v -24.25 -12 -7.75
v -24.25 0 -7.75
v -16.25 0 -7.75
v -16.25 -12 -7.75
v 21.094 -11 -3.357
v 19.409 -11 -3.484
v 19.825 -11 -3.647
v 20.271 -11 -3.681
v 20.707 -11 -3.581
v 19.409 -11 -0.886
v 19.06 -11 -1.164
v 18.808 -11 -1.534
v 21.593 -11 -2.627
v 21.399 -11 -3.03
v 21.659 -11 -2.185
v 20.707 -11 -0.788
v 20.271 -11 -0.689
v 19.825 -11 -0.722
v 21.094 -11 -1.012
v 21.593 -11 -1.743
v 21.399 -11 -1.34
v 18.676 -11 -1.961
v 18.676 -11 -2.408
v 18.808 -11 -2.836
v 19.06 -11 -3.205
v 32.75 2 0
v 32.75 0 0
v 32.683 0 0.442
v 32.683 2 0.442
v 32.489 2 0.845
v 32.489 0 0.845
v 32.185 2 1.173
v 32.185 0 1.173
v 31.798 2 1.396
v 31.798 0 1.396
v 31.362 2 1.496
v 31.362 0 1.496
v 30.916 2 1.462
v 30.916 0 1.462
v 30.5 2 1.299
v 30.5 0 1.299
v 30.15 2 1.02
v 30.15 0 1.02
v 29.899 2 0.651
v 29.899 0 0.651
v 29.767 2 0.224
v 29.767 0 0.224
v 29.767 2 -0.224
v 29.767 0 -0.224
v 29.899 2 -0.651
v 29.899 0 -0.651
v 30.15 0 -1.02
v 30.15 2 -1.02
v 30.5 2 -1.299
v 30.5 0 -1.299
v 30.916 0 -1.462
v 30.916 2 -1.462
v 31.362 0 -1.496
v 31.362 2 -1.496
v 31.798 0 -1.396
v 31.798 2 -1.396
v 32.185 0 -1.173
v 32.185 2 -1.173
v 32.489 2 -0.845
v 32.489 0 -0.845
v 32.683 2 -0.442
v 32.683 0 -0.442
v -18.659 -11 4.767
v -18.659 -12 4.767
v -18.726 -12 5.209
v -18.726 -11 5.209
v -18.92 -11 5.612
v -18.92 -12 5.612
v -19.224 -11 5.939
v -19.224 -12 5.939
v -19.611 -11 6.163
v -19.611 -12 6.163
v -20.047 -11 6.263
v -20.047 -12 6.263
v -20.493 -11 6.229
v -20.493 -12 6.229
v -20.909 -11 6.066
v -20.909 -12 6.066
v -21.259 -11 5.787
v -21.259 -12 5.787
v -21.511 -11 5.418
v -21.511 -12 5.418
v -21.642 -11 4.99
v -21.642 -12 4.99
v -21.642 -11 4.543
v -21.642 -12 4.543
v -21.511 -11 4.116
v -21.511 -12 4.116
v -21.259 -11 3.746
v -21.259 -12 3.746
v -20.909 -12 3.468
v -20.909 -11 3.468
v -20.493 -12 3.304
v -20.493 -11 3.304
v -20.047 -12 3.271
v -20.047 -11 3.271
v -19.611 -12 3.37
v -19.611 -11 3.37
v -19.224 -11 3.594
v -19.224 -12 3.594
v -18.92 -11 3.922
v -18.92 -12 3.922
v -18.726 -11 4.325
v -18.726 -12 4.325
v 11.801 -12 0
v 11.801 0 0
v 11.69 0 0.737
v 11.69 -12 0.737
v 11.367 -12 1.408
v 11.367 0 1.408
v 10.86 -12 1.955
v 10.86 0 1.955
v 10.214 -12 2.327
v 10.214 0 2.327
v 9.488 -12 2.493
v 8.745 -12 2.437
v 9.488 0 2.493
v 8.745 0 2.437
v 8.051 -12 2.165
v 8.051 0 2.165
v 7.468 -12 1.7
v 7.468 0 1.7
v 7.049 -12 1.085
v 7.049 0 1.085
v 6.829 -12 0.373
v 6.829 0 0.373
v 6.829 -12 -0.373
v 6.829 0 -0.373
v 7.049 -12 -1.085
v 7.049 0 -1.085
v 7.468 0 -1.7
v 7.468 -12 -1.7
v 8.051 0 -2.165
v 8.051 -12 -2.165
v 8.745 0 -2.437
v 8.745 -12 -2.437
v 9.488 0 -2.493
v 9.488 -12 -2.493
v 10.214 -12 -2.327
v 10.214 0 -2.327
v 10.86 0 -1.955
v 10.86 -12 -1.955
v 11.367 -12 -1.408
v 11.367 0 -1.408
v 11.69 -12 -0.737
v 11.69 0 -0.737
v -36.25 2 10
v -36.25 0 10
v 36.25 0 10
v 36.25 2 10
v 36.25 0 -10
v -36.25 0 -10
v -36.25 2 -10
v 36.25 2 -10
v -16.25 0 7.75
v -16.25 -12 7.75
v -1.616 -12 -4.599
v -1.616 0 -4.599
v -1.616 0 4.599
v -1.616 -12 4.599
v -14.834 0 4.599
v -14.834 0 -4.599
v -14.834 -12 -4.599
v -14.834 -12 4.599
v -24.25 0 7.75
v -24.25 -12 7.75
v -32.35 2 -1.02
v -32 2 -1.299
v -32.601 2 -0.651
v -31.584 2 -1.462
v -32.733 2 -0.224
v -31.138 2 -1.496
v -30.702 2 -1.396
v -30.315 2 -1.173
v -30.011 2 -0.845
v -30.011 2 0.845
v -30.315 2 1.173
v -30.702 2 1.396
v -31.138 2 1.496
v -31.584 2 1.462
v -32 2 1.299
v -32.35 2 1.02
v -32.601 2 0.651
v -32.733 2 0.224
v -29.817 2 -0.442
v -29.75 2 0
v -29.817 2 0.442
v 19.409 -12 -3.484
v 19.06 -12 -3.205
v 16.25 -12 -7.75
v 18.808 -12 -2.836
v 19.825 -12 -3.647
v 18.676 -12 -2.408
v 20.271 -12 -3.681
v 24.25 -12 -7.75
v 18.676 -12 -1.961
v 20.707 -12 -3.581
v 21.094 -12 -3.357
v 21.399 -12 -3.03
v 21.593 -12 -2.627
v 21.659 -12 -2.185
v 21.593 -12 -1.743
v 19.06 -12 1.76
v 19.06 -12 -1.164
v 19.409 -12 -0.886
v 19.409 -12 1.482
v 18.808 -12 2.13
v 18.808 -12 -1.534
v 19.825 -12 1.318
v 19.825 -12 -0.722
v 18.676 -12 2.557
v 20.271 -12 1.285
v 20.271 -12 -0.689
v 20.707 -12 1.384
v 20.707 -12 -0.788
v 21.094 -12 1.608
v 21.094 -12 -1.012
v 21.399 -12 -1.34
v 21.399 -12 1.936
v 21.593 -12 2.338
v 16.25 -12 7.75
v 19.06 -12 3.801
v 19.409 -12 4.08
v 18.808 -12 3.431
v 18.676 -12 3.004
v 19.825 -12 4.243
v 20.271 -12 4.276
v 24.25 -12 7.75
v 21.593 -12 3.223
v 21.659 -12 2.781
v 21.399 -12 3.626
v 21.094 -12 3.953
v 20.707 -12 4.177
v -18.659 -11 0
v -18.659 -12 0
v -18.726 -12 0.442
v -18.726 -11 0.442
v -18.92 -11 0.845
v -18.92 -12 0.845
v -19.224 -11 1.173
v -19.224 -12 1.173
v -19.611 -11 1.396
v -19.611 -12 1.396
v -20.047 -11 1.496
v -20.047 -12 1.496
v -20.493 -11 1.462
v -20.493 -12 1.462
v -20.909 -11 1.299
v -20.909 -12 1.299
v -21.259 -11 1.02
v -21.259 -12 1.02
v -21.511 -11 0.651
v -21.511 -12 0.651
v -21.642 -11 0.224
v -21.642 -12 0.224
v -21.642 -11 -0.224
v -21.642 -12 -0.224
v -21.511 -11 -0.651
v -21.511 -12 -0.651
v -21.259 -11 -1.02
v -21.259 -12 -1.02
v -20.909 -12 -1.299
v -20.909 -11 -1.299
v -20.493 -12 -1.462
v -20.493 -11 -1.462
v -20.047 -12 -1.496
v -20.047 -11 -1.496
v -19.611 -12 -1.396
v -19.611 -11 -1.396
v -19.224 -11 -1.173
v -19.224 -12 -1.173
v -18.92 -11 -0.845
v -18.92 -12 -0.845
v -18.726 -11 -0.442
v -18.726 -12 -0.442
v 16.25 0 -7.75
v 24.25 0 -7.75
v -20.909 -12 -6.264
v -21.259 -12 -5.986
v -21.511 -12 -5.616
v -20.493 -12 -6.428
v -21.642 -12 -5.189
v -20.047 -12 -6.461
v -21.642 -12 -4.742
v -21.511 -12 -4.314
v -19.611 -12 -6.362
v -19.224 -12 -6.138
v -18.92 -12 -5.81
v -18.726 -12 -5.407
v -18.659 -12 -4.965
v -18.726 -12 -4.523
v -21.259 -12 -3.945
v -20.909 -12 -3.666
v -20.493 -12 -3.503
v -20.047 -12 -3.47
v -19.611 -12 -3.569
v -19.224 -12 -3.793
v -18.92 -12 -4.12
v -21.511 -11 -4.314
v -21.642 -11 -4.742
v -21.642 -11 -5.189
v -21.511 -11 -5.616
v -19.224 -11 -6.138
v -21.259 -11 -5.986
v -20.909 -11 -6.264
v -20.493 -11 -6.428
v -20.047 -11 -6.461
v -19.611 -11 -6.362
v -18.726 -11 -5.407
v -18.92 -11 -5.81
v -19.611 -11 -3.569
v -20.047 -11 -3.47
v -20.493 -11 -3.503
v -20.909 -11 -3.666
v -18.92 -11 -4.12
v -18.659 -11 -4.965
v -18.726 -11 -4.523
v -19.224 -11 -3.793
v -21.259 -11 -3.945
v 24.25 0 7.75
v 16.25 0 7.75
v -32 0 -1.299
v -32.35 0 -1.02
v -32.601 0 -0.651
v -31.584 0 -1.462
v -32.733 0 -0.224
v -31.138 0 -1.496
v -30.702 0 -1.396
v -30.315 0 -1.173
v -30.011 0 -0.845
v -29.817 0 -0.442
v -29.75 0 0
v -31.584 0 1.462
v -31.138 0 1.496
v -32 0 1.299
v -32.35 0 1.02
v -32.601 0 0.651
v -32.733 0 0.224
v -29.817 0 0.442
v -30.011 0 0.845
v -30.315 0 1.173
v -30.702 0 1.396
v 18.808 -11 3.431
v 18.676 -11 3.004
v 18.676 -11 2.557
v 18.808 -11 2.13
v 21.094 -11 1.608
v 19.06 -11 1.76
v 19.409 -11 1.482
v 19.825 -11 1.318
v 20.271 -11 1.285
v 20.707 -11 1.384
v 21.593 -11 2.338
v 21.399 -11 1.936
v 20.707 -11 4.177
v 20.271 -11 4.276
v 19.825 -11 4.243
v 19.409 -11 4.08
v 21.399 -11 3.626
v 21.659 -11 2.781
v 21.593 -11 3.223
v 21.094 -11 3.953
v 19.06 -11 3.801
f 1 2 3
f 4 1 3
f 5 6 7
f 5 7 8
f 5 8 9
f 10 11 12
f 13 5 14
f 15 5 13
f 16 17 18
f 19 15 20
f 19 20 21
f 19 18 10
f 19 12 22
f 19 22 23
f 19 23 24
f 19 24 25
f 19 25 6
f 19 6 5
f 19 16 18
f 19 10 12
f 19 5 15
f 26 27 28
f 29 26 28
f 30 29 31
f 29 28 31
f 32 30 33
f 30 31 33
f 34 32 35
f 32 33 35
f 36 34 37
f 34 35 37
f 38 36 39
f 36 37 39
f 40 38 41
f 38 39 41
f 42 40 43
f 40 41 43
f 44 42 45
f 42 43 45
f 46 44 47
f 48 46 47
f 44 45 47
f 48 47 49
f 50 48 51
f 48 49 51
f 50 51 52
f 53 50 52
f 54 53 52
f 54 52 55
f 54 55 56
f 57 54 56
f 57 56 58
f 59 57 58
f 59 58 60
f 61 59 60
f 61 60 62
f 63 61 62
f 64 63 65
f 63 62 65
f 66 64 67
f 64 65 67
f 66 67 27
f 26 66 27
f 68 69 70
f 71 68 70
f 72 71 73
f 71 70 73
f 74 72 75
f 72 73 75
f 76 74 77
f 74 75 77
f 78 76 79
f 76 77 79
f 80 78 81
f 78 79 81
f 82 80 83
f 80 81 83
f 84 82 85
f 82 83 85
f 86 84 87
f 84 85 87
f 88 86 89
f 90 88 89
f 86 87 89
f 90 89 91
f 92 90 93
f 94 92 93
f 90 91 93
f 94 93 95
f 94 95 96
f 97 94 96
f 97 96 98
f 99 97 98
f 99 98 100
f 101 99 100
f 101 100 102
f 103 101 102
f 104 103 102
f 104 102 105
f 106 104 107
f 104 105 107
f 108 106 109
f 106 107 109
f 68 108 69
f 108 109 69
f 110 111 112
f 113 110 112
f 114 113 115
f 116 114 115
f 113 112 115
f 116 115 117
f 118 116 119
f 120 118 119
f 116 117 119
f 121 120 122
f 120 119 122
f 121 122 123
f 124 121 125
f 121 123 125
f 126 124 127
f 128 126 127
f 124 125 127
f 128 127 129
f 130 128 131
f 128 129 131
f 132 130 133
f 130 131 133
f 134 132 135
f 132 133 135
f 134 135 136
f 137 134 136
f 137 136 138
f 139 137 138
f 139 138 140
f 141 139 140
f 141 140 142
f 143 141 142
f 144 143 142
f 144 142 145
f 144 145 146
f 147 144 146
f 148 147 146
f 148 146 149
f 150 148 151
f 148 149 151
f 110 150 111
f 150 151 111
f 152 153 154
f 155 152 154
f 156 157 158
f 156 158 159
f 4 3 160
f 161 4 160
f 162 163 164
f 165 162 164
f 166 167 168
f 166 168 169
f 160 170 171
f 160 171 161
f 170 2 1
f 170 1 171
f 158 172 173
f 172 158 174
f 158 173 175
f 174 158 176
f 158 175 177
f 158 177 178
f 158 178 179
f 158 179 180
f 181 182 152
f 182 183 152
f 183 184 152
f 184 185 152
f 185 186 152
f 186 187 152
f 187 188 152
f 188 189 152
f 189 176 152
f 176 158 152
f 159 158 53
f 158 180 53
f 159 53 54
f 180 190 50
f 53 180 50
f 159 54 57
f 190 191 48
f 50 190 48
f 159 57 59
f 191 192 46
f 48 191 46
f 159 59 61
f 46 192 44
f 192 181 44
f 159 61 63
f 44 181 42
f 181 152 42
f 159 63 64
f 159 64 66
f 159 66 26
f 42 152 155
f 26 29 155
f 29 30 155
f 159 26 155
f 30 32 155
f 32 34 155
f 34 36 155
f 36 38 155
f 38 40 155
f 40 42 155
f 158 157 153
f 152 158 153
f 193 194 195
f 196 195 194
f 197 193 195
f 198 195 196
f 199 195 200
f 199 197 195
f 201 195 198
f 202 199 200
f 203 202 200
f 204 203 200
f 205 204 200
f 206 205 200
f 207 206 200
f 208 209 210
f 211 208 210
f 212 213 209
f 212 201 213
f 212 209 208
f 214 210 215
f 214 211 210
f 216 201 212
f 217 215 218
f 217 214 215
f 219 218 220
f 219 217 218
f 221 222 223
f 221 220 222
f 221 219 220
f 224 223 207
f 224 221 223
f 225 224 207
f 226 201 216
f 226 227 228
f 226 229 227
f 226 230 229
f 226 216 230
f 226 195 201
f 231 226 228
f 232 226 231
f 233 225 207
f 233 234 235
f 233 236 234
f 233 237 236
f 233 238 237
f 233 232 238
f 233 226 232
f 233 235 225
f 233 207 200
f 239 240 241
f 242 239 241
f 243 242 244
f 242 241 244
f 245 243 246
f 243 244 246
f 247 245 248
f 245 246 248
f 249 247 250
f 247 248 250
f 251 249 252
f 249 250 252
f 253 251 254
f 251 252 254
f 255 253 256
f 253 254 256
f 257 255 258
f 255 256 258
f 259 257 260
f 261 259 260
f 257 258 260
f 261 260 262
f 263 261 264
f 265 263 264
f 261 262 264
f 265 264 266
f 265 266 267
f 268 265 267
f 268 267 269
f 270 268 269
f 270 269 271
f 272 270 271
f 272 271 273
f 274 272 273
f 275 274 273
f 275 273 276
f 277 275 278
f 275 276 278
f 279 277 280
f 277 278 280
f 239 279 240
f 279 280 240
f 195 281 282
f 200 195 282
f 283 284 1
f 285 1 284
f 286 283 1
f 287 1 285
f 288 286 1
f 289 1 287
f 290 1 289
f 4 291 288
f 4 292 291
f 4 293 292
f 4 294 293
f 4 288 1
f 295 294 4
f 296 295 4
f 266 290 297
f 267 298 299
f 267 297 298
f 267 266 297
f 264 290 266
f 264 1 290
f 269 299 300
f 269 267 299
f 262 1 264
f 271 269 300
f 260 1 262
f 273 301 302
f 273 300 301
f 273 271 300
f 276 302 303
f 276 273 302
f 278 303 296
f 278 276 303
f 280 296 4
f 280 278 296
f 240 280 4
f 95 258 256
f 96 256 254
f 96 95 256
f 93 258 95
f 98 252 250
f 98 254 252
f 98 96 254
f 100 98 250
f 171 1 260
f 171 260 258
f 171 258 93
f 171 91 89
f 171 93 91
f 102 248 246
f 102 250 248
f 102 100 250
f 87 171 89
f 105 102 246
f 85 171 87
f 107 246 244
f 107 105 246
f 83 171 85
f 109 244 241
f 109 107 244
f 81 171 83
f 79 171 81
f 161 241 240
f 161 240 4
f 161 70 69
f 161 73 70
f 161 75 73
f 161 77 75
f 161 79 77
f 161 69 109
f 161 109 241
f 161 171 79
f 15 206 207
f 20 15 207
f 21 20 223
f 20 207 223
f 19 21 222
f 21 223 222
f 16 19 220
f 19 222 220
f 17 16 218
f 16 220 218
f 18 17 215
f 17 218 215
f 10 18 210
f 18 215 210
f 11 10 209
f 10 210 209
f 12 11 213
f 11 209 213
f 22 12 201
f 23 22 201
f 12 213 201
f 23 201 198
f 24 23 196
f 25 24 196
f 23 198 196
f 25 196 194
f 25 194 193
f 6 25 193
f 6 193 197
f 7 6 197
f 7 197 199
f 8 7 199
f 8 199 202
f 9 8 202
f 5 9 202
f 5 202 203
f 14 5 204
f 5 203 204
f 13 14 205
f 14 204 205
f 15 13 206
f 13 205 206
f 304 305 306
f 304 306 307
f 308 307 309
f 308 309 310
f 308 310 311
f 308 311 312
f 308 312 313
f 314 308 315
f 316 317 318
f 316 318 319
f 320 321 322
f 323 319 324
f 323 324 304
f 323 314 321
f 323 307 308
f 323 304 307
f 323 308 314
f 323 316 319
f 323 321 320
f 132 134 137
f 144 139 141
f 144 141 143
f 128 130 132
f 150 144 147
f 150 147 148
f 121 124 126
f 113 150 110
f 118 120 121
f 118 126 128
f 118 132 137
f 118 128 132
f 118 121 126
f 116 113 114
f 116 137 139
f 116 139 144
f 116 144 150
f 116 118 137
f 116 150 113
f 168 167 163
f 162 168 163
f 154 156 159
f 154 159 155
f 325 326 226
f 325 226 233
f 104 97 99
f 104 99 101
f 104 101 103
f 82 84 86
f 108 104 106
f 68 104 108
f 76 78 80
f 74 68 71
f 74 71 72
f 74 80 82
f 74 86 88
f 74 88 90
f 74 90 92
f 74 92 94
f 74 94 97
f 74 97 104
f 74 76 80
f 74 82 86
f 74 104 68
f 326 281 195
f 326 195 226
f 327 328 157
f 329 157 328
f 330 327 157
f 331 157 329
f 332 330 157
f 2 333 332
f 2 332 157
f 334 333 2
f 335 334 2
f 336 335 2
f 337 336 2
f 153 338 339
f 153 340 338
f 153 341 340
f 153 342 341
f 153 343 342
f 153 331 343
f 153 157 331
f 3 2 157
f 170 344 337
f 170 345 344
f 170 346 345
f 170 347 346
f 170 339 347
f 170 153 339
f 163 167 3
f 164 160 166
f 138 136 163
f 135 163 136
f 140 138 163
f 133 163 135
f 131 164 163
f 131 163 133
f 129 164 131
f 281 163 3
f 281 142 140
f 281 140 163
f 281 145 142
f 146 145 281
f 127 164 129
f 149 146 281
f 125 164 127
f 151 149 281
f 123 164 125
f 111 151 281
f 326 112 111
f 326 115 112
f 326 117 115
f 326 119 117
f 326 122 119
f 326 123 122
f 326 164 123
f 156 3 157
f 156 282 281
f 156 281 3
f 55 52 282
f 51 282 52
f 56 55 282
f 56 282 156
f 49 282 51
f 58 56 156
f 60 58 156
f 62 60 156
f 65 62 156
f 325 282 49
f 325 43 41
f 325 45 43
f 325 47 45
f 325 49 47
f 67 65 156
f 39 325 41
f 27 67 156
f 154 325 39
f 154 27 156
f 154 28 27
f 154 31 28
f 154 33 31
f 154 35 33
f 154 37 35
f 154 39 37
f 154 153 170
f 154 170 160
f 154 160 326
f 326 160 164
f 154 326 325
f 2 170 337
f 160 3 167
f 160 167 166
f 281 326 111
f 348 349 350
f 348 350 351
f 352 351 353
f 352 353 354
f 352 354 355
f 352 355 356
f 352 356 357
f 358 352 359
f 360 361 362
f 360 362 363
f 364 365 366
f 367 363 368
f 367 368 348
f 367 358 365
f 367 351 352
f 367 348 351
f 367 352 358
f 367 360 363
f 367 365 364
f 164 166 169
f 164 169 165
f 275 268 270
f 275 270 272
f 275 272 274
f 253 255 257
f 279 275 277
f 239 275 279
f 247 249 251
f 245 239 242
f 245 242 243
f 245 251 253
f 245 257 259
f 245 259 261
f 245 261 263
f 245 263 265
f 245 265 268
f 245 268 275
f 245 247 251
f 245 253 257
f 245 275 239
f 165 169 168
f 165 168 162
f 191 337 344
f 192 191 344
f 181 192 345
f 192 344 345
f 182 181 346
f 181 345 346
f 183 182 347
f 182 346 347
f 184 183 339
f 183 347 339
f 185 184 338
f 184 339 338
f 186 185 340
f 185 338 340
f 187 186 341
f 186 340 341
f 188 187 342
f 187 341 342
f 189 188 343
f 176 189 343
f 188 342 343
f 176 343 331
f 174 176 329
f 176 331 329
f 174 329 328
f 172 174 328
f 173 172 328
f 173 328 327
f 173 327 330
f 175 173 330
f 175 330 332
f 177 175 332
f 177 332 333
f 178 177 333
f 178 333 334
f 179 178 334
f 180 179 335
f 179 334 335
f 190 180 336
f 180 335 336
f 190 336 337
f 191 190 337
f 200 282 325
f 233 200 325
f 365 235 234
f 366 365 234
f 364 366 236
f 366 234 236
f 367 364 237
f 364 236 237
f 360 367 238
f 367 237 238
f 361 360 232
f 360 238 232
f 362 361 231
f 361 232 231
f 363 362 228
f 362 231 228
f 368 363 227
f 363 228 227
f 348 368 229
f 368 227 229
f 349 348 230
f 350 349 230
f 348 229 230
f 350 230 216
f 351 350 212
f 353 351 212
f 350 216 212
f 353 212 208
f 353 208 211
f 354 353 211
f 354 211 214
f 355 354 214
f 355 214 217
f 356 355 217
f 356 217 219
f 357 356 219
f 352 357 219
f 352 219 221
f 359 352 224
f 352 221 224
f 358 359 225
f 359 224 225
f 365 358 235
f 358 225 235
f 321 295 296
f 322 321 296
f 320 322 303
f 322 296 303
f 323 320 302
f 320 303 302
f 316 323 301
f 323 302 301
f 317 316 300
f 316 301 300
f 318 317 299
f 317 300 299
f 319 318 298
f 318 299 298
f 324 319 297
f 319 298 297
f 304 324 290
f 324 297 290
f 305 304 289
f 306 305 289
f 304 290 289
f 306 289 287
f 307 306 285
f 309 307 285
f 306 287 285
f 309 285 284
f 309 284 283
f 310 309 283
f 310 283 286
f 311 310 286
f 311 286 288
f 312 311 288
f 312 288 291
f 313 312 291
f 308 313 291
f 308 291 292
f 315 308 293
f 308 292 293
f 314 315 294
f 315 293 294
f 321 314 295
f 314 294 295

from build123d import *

# Parameters (mm, degrees)
F0_W     = 72.5
F0_H     = 20
F1_DEPTH = 2
F2_R     = 1.5
F3_DEPTH = 2
F4_W     = 8
F4_H     = 15.5
F4_W_2   = 13.217593
F4_H_2   = 9.198598
F4_R     = 2.5
F5_DEPTH = 12
F6_R     = 1.5
F7_DEPTH = 1


with BuildPart() as f1:
    # F0 (on Front) → F1 (new body)
    with BuildSketch(Plane.XZ):
        Rectangle(F0_W, F0_H)
    extrude(amount=-F1_DEPTH)

    # F2 (on face) → F3 (cut, through all)
    with BuildSketch(Plane.XZ):
        with Locations((-31.25, 0)):
            Circle(F2_R)
        with Locations((31.25, 0)):
            Circle(F2_R)
    extrude(amount=-F3_DEPTH, mode=Mode.SUBTRACT)

    # F4 (on face) → F5 (join)
    with BuildSketch(Plane.XZ):
        with Locations((-20.25, 0)):
            Rectangle(F4_W, F4_H)
        with Locations((20.25, 0)):
            Rectangle(F4_W, F4_H)
        with Locations((-8.224997, 0)):
            Rectangle(F4_W_2, F4_H_2)
        with Locations((9.300935, 0)):
            Circle(F4_R)
    extrude(amount=F5_DEPTH)

    # F6 (on face) → F7 (cut)
    with BuildSketch(Plane.XZ.offset(12)):
        with Locations((-20.159207, 4.766709)):
            Circle(F6_R)
        with Locations((-20.159207, 0)):
            Circle(F6_R)
        with Locations((-20.159207, -4.965322)):
            Circle(F6_R)
        with Locations((20.159205, 2.78058)):
            Circle(F6_R)
        with Locations((20.159205, -2.184742)):
            Circle(F6_R)
    extrude(amount=-F7_DEPTH, mode=Mode.SUBTRACT)


solid = f1.part
